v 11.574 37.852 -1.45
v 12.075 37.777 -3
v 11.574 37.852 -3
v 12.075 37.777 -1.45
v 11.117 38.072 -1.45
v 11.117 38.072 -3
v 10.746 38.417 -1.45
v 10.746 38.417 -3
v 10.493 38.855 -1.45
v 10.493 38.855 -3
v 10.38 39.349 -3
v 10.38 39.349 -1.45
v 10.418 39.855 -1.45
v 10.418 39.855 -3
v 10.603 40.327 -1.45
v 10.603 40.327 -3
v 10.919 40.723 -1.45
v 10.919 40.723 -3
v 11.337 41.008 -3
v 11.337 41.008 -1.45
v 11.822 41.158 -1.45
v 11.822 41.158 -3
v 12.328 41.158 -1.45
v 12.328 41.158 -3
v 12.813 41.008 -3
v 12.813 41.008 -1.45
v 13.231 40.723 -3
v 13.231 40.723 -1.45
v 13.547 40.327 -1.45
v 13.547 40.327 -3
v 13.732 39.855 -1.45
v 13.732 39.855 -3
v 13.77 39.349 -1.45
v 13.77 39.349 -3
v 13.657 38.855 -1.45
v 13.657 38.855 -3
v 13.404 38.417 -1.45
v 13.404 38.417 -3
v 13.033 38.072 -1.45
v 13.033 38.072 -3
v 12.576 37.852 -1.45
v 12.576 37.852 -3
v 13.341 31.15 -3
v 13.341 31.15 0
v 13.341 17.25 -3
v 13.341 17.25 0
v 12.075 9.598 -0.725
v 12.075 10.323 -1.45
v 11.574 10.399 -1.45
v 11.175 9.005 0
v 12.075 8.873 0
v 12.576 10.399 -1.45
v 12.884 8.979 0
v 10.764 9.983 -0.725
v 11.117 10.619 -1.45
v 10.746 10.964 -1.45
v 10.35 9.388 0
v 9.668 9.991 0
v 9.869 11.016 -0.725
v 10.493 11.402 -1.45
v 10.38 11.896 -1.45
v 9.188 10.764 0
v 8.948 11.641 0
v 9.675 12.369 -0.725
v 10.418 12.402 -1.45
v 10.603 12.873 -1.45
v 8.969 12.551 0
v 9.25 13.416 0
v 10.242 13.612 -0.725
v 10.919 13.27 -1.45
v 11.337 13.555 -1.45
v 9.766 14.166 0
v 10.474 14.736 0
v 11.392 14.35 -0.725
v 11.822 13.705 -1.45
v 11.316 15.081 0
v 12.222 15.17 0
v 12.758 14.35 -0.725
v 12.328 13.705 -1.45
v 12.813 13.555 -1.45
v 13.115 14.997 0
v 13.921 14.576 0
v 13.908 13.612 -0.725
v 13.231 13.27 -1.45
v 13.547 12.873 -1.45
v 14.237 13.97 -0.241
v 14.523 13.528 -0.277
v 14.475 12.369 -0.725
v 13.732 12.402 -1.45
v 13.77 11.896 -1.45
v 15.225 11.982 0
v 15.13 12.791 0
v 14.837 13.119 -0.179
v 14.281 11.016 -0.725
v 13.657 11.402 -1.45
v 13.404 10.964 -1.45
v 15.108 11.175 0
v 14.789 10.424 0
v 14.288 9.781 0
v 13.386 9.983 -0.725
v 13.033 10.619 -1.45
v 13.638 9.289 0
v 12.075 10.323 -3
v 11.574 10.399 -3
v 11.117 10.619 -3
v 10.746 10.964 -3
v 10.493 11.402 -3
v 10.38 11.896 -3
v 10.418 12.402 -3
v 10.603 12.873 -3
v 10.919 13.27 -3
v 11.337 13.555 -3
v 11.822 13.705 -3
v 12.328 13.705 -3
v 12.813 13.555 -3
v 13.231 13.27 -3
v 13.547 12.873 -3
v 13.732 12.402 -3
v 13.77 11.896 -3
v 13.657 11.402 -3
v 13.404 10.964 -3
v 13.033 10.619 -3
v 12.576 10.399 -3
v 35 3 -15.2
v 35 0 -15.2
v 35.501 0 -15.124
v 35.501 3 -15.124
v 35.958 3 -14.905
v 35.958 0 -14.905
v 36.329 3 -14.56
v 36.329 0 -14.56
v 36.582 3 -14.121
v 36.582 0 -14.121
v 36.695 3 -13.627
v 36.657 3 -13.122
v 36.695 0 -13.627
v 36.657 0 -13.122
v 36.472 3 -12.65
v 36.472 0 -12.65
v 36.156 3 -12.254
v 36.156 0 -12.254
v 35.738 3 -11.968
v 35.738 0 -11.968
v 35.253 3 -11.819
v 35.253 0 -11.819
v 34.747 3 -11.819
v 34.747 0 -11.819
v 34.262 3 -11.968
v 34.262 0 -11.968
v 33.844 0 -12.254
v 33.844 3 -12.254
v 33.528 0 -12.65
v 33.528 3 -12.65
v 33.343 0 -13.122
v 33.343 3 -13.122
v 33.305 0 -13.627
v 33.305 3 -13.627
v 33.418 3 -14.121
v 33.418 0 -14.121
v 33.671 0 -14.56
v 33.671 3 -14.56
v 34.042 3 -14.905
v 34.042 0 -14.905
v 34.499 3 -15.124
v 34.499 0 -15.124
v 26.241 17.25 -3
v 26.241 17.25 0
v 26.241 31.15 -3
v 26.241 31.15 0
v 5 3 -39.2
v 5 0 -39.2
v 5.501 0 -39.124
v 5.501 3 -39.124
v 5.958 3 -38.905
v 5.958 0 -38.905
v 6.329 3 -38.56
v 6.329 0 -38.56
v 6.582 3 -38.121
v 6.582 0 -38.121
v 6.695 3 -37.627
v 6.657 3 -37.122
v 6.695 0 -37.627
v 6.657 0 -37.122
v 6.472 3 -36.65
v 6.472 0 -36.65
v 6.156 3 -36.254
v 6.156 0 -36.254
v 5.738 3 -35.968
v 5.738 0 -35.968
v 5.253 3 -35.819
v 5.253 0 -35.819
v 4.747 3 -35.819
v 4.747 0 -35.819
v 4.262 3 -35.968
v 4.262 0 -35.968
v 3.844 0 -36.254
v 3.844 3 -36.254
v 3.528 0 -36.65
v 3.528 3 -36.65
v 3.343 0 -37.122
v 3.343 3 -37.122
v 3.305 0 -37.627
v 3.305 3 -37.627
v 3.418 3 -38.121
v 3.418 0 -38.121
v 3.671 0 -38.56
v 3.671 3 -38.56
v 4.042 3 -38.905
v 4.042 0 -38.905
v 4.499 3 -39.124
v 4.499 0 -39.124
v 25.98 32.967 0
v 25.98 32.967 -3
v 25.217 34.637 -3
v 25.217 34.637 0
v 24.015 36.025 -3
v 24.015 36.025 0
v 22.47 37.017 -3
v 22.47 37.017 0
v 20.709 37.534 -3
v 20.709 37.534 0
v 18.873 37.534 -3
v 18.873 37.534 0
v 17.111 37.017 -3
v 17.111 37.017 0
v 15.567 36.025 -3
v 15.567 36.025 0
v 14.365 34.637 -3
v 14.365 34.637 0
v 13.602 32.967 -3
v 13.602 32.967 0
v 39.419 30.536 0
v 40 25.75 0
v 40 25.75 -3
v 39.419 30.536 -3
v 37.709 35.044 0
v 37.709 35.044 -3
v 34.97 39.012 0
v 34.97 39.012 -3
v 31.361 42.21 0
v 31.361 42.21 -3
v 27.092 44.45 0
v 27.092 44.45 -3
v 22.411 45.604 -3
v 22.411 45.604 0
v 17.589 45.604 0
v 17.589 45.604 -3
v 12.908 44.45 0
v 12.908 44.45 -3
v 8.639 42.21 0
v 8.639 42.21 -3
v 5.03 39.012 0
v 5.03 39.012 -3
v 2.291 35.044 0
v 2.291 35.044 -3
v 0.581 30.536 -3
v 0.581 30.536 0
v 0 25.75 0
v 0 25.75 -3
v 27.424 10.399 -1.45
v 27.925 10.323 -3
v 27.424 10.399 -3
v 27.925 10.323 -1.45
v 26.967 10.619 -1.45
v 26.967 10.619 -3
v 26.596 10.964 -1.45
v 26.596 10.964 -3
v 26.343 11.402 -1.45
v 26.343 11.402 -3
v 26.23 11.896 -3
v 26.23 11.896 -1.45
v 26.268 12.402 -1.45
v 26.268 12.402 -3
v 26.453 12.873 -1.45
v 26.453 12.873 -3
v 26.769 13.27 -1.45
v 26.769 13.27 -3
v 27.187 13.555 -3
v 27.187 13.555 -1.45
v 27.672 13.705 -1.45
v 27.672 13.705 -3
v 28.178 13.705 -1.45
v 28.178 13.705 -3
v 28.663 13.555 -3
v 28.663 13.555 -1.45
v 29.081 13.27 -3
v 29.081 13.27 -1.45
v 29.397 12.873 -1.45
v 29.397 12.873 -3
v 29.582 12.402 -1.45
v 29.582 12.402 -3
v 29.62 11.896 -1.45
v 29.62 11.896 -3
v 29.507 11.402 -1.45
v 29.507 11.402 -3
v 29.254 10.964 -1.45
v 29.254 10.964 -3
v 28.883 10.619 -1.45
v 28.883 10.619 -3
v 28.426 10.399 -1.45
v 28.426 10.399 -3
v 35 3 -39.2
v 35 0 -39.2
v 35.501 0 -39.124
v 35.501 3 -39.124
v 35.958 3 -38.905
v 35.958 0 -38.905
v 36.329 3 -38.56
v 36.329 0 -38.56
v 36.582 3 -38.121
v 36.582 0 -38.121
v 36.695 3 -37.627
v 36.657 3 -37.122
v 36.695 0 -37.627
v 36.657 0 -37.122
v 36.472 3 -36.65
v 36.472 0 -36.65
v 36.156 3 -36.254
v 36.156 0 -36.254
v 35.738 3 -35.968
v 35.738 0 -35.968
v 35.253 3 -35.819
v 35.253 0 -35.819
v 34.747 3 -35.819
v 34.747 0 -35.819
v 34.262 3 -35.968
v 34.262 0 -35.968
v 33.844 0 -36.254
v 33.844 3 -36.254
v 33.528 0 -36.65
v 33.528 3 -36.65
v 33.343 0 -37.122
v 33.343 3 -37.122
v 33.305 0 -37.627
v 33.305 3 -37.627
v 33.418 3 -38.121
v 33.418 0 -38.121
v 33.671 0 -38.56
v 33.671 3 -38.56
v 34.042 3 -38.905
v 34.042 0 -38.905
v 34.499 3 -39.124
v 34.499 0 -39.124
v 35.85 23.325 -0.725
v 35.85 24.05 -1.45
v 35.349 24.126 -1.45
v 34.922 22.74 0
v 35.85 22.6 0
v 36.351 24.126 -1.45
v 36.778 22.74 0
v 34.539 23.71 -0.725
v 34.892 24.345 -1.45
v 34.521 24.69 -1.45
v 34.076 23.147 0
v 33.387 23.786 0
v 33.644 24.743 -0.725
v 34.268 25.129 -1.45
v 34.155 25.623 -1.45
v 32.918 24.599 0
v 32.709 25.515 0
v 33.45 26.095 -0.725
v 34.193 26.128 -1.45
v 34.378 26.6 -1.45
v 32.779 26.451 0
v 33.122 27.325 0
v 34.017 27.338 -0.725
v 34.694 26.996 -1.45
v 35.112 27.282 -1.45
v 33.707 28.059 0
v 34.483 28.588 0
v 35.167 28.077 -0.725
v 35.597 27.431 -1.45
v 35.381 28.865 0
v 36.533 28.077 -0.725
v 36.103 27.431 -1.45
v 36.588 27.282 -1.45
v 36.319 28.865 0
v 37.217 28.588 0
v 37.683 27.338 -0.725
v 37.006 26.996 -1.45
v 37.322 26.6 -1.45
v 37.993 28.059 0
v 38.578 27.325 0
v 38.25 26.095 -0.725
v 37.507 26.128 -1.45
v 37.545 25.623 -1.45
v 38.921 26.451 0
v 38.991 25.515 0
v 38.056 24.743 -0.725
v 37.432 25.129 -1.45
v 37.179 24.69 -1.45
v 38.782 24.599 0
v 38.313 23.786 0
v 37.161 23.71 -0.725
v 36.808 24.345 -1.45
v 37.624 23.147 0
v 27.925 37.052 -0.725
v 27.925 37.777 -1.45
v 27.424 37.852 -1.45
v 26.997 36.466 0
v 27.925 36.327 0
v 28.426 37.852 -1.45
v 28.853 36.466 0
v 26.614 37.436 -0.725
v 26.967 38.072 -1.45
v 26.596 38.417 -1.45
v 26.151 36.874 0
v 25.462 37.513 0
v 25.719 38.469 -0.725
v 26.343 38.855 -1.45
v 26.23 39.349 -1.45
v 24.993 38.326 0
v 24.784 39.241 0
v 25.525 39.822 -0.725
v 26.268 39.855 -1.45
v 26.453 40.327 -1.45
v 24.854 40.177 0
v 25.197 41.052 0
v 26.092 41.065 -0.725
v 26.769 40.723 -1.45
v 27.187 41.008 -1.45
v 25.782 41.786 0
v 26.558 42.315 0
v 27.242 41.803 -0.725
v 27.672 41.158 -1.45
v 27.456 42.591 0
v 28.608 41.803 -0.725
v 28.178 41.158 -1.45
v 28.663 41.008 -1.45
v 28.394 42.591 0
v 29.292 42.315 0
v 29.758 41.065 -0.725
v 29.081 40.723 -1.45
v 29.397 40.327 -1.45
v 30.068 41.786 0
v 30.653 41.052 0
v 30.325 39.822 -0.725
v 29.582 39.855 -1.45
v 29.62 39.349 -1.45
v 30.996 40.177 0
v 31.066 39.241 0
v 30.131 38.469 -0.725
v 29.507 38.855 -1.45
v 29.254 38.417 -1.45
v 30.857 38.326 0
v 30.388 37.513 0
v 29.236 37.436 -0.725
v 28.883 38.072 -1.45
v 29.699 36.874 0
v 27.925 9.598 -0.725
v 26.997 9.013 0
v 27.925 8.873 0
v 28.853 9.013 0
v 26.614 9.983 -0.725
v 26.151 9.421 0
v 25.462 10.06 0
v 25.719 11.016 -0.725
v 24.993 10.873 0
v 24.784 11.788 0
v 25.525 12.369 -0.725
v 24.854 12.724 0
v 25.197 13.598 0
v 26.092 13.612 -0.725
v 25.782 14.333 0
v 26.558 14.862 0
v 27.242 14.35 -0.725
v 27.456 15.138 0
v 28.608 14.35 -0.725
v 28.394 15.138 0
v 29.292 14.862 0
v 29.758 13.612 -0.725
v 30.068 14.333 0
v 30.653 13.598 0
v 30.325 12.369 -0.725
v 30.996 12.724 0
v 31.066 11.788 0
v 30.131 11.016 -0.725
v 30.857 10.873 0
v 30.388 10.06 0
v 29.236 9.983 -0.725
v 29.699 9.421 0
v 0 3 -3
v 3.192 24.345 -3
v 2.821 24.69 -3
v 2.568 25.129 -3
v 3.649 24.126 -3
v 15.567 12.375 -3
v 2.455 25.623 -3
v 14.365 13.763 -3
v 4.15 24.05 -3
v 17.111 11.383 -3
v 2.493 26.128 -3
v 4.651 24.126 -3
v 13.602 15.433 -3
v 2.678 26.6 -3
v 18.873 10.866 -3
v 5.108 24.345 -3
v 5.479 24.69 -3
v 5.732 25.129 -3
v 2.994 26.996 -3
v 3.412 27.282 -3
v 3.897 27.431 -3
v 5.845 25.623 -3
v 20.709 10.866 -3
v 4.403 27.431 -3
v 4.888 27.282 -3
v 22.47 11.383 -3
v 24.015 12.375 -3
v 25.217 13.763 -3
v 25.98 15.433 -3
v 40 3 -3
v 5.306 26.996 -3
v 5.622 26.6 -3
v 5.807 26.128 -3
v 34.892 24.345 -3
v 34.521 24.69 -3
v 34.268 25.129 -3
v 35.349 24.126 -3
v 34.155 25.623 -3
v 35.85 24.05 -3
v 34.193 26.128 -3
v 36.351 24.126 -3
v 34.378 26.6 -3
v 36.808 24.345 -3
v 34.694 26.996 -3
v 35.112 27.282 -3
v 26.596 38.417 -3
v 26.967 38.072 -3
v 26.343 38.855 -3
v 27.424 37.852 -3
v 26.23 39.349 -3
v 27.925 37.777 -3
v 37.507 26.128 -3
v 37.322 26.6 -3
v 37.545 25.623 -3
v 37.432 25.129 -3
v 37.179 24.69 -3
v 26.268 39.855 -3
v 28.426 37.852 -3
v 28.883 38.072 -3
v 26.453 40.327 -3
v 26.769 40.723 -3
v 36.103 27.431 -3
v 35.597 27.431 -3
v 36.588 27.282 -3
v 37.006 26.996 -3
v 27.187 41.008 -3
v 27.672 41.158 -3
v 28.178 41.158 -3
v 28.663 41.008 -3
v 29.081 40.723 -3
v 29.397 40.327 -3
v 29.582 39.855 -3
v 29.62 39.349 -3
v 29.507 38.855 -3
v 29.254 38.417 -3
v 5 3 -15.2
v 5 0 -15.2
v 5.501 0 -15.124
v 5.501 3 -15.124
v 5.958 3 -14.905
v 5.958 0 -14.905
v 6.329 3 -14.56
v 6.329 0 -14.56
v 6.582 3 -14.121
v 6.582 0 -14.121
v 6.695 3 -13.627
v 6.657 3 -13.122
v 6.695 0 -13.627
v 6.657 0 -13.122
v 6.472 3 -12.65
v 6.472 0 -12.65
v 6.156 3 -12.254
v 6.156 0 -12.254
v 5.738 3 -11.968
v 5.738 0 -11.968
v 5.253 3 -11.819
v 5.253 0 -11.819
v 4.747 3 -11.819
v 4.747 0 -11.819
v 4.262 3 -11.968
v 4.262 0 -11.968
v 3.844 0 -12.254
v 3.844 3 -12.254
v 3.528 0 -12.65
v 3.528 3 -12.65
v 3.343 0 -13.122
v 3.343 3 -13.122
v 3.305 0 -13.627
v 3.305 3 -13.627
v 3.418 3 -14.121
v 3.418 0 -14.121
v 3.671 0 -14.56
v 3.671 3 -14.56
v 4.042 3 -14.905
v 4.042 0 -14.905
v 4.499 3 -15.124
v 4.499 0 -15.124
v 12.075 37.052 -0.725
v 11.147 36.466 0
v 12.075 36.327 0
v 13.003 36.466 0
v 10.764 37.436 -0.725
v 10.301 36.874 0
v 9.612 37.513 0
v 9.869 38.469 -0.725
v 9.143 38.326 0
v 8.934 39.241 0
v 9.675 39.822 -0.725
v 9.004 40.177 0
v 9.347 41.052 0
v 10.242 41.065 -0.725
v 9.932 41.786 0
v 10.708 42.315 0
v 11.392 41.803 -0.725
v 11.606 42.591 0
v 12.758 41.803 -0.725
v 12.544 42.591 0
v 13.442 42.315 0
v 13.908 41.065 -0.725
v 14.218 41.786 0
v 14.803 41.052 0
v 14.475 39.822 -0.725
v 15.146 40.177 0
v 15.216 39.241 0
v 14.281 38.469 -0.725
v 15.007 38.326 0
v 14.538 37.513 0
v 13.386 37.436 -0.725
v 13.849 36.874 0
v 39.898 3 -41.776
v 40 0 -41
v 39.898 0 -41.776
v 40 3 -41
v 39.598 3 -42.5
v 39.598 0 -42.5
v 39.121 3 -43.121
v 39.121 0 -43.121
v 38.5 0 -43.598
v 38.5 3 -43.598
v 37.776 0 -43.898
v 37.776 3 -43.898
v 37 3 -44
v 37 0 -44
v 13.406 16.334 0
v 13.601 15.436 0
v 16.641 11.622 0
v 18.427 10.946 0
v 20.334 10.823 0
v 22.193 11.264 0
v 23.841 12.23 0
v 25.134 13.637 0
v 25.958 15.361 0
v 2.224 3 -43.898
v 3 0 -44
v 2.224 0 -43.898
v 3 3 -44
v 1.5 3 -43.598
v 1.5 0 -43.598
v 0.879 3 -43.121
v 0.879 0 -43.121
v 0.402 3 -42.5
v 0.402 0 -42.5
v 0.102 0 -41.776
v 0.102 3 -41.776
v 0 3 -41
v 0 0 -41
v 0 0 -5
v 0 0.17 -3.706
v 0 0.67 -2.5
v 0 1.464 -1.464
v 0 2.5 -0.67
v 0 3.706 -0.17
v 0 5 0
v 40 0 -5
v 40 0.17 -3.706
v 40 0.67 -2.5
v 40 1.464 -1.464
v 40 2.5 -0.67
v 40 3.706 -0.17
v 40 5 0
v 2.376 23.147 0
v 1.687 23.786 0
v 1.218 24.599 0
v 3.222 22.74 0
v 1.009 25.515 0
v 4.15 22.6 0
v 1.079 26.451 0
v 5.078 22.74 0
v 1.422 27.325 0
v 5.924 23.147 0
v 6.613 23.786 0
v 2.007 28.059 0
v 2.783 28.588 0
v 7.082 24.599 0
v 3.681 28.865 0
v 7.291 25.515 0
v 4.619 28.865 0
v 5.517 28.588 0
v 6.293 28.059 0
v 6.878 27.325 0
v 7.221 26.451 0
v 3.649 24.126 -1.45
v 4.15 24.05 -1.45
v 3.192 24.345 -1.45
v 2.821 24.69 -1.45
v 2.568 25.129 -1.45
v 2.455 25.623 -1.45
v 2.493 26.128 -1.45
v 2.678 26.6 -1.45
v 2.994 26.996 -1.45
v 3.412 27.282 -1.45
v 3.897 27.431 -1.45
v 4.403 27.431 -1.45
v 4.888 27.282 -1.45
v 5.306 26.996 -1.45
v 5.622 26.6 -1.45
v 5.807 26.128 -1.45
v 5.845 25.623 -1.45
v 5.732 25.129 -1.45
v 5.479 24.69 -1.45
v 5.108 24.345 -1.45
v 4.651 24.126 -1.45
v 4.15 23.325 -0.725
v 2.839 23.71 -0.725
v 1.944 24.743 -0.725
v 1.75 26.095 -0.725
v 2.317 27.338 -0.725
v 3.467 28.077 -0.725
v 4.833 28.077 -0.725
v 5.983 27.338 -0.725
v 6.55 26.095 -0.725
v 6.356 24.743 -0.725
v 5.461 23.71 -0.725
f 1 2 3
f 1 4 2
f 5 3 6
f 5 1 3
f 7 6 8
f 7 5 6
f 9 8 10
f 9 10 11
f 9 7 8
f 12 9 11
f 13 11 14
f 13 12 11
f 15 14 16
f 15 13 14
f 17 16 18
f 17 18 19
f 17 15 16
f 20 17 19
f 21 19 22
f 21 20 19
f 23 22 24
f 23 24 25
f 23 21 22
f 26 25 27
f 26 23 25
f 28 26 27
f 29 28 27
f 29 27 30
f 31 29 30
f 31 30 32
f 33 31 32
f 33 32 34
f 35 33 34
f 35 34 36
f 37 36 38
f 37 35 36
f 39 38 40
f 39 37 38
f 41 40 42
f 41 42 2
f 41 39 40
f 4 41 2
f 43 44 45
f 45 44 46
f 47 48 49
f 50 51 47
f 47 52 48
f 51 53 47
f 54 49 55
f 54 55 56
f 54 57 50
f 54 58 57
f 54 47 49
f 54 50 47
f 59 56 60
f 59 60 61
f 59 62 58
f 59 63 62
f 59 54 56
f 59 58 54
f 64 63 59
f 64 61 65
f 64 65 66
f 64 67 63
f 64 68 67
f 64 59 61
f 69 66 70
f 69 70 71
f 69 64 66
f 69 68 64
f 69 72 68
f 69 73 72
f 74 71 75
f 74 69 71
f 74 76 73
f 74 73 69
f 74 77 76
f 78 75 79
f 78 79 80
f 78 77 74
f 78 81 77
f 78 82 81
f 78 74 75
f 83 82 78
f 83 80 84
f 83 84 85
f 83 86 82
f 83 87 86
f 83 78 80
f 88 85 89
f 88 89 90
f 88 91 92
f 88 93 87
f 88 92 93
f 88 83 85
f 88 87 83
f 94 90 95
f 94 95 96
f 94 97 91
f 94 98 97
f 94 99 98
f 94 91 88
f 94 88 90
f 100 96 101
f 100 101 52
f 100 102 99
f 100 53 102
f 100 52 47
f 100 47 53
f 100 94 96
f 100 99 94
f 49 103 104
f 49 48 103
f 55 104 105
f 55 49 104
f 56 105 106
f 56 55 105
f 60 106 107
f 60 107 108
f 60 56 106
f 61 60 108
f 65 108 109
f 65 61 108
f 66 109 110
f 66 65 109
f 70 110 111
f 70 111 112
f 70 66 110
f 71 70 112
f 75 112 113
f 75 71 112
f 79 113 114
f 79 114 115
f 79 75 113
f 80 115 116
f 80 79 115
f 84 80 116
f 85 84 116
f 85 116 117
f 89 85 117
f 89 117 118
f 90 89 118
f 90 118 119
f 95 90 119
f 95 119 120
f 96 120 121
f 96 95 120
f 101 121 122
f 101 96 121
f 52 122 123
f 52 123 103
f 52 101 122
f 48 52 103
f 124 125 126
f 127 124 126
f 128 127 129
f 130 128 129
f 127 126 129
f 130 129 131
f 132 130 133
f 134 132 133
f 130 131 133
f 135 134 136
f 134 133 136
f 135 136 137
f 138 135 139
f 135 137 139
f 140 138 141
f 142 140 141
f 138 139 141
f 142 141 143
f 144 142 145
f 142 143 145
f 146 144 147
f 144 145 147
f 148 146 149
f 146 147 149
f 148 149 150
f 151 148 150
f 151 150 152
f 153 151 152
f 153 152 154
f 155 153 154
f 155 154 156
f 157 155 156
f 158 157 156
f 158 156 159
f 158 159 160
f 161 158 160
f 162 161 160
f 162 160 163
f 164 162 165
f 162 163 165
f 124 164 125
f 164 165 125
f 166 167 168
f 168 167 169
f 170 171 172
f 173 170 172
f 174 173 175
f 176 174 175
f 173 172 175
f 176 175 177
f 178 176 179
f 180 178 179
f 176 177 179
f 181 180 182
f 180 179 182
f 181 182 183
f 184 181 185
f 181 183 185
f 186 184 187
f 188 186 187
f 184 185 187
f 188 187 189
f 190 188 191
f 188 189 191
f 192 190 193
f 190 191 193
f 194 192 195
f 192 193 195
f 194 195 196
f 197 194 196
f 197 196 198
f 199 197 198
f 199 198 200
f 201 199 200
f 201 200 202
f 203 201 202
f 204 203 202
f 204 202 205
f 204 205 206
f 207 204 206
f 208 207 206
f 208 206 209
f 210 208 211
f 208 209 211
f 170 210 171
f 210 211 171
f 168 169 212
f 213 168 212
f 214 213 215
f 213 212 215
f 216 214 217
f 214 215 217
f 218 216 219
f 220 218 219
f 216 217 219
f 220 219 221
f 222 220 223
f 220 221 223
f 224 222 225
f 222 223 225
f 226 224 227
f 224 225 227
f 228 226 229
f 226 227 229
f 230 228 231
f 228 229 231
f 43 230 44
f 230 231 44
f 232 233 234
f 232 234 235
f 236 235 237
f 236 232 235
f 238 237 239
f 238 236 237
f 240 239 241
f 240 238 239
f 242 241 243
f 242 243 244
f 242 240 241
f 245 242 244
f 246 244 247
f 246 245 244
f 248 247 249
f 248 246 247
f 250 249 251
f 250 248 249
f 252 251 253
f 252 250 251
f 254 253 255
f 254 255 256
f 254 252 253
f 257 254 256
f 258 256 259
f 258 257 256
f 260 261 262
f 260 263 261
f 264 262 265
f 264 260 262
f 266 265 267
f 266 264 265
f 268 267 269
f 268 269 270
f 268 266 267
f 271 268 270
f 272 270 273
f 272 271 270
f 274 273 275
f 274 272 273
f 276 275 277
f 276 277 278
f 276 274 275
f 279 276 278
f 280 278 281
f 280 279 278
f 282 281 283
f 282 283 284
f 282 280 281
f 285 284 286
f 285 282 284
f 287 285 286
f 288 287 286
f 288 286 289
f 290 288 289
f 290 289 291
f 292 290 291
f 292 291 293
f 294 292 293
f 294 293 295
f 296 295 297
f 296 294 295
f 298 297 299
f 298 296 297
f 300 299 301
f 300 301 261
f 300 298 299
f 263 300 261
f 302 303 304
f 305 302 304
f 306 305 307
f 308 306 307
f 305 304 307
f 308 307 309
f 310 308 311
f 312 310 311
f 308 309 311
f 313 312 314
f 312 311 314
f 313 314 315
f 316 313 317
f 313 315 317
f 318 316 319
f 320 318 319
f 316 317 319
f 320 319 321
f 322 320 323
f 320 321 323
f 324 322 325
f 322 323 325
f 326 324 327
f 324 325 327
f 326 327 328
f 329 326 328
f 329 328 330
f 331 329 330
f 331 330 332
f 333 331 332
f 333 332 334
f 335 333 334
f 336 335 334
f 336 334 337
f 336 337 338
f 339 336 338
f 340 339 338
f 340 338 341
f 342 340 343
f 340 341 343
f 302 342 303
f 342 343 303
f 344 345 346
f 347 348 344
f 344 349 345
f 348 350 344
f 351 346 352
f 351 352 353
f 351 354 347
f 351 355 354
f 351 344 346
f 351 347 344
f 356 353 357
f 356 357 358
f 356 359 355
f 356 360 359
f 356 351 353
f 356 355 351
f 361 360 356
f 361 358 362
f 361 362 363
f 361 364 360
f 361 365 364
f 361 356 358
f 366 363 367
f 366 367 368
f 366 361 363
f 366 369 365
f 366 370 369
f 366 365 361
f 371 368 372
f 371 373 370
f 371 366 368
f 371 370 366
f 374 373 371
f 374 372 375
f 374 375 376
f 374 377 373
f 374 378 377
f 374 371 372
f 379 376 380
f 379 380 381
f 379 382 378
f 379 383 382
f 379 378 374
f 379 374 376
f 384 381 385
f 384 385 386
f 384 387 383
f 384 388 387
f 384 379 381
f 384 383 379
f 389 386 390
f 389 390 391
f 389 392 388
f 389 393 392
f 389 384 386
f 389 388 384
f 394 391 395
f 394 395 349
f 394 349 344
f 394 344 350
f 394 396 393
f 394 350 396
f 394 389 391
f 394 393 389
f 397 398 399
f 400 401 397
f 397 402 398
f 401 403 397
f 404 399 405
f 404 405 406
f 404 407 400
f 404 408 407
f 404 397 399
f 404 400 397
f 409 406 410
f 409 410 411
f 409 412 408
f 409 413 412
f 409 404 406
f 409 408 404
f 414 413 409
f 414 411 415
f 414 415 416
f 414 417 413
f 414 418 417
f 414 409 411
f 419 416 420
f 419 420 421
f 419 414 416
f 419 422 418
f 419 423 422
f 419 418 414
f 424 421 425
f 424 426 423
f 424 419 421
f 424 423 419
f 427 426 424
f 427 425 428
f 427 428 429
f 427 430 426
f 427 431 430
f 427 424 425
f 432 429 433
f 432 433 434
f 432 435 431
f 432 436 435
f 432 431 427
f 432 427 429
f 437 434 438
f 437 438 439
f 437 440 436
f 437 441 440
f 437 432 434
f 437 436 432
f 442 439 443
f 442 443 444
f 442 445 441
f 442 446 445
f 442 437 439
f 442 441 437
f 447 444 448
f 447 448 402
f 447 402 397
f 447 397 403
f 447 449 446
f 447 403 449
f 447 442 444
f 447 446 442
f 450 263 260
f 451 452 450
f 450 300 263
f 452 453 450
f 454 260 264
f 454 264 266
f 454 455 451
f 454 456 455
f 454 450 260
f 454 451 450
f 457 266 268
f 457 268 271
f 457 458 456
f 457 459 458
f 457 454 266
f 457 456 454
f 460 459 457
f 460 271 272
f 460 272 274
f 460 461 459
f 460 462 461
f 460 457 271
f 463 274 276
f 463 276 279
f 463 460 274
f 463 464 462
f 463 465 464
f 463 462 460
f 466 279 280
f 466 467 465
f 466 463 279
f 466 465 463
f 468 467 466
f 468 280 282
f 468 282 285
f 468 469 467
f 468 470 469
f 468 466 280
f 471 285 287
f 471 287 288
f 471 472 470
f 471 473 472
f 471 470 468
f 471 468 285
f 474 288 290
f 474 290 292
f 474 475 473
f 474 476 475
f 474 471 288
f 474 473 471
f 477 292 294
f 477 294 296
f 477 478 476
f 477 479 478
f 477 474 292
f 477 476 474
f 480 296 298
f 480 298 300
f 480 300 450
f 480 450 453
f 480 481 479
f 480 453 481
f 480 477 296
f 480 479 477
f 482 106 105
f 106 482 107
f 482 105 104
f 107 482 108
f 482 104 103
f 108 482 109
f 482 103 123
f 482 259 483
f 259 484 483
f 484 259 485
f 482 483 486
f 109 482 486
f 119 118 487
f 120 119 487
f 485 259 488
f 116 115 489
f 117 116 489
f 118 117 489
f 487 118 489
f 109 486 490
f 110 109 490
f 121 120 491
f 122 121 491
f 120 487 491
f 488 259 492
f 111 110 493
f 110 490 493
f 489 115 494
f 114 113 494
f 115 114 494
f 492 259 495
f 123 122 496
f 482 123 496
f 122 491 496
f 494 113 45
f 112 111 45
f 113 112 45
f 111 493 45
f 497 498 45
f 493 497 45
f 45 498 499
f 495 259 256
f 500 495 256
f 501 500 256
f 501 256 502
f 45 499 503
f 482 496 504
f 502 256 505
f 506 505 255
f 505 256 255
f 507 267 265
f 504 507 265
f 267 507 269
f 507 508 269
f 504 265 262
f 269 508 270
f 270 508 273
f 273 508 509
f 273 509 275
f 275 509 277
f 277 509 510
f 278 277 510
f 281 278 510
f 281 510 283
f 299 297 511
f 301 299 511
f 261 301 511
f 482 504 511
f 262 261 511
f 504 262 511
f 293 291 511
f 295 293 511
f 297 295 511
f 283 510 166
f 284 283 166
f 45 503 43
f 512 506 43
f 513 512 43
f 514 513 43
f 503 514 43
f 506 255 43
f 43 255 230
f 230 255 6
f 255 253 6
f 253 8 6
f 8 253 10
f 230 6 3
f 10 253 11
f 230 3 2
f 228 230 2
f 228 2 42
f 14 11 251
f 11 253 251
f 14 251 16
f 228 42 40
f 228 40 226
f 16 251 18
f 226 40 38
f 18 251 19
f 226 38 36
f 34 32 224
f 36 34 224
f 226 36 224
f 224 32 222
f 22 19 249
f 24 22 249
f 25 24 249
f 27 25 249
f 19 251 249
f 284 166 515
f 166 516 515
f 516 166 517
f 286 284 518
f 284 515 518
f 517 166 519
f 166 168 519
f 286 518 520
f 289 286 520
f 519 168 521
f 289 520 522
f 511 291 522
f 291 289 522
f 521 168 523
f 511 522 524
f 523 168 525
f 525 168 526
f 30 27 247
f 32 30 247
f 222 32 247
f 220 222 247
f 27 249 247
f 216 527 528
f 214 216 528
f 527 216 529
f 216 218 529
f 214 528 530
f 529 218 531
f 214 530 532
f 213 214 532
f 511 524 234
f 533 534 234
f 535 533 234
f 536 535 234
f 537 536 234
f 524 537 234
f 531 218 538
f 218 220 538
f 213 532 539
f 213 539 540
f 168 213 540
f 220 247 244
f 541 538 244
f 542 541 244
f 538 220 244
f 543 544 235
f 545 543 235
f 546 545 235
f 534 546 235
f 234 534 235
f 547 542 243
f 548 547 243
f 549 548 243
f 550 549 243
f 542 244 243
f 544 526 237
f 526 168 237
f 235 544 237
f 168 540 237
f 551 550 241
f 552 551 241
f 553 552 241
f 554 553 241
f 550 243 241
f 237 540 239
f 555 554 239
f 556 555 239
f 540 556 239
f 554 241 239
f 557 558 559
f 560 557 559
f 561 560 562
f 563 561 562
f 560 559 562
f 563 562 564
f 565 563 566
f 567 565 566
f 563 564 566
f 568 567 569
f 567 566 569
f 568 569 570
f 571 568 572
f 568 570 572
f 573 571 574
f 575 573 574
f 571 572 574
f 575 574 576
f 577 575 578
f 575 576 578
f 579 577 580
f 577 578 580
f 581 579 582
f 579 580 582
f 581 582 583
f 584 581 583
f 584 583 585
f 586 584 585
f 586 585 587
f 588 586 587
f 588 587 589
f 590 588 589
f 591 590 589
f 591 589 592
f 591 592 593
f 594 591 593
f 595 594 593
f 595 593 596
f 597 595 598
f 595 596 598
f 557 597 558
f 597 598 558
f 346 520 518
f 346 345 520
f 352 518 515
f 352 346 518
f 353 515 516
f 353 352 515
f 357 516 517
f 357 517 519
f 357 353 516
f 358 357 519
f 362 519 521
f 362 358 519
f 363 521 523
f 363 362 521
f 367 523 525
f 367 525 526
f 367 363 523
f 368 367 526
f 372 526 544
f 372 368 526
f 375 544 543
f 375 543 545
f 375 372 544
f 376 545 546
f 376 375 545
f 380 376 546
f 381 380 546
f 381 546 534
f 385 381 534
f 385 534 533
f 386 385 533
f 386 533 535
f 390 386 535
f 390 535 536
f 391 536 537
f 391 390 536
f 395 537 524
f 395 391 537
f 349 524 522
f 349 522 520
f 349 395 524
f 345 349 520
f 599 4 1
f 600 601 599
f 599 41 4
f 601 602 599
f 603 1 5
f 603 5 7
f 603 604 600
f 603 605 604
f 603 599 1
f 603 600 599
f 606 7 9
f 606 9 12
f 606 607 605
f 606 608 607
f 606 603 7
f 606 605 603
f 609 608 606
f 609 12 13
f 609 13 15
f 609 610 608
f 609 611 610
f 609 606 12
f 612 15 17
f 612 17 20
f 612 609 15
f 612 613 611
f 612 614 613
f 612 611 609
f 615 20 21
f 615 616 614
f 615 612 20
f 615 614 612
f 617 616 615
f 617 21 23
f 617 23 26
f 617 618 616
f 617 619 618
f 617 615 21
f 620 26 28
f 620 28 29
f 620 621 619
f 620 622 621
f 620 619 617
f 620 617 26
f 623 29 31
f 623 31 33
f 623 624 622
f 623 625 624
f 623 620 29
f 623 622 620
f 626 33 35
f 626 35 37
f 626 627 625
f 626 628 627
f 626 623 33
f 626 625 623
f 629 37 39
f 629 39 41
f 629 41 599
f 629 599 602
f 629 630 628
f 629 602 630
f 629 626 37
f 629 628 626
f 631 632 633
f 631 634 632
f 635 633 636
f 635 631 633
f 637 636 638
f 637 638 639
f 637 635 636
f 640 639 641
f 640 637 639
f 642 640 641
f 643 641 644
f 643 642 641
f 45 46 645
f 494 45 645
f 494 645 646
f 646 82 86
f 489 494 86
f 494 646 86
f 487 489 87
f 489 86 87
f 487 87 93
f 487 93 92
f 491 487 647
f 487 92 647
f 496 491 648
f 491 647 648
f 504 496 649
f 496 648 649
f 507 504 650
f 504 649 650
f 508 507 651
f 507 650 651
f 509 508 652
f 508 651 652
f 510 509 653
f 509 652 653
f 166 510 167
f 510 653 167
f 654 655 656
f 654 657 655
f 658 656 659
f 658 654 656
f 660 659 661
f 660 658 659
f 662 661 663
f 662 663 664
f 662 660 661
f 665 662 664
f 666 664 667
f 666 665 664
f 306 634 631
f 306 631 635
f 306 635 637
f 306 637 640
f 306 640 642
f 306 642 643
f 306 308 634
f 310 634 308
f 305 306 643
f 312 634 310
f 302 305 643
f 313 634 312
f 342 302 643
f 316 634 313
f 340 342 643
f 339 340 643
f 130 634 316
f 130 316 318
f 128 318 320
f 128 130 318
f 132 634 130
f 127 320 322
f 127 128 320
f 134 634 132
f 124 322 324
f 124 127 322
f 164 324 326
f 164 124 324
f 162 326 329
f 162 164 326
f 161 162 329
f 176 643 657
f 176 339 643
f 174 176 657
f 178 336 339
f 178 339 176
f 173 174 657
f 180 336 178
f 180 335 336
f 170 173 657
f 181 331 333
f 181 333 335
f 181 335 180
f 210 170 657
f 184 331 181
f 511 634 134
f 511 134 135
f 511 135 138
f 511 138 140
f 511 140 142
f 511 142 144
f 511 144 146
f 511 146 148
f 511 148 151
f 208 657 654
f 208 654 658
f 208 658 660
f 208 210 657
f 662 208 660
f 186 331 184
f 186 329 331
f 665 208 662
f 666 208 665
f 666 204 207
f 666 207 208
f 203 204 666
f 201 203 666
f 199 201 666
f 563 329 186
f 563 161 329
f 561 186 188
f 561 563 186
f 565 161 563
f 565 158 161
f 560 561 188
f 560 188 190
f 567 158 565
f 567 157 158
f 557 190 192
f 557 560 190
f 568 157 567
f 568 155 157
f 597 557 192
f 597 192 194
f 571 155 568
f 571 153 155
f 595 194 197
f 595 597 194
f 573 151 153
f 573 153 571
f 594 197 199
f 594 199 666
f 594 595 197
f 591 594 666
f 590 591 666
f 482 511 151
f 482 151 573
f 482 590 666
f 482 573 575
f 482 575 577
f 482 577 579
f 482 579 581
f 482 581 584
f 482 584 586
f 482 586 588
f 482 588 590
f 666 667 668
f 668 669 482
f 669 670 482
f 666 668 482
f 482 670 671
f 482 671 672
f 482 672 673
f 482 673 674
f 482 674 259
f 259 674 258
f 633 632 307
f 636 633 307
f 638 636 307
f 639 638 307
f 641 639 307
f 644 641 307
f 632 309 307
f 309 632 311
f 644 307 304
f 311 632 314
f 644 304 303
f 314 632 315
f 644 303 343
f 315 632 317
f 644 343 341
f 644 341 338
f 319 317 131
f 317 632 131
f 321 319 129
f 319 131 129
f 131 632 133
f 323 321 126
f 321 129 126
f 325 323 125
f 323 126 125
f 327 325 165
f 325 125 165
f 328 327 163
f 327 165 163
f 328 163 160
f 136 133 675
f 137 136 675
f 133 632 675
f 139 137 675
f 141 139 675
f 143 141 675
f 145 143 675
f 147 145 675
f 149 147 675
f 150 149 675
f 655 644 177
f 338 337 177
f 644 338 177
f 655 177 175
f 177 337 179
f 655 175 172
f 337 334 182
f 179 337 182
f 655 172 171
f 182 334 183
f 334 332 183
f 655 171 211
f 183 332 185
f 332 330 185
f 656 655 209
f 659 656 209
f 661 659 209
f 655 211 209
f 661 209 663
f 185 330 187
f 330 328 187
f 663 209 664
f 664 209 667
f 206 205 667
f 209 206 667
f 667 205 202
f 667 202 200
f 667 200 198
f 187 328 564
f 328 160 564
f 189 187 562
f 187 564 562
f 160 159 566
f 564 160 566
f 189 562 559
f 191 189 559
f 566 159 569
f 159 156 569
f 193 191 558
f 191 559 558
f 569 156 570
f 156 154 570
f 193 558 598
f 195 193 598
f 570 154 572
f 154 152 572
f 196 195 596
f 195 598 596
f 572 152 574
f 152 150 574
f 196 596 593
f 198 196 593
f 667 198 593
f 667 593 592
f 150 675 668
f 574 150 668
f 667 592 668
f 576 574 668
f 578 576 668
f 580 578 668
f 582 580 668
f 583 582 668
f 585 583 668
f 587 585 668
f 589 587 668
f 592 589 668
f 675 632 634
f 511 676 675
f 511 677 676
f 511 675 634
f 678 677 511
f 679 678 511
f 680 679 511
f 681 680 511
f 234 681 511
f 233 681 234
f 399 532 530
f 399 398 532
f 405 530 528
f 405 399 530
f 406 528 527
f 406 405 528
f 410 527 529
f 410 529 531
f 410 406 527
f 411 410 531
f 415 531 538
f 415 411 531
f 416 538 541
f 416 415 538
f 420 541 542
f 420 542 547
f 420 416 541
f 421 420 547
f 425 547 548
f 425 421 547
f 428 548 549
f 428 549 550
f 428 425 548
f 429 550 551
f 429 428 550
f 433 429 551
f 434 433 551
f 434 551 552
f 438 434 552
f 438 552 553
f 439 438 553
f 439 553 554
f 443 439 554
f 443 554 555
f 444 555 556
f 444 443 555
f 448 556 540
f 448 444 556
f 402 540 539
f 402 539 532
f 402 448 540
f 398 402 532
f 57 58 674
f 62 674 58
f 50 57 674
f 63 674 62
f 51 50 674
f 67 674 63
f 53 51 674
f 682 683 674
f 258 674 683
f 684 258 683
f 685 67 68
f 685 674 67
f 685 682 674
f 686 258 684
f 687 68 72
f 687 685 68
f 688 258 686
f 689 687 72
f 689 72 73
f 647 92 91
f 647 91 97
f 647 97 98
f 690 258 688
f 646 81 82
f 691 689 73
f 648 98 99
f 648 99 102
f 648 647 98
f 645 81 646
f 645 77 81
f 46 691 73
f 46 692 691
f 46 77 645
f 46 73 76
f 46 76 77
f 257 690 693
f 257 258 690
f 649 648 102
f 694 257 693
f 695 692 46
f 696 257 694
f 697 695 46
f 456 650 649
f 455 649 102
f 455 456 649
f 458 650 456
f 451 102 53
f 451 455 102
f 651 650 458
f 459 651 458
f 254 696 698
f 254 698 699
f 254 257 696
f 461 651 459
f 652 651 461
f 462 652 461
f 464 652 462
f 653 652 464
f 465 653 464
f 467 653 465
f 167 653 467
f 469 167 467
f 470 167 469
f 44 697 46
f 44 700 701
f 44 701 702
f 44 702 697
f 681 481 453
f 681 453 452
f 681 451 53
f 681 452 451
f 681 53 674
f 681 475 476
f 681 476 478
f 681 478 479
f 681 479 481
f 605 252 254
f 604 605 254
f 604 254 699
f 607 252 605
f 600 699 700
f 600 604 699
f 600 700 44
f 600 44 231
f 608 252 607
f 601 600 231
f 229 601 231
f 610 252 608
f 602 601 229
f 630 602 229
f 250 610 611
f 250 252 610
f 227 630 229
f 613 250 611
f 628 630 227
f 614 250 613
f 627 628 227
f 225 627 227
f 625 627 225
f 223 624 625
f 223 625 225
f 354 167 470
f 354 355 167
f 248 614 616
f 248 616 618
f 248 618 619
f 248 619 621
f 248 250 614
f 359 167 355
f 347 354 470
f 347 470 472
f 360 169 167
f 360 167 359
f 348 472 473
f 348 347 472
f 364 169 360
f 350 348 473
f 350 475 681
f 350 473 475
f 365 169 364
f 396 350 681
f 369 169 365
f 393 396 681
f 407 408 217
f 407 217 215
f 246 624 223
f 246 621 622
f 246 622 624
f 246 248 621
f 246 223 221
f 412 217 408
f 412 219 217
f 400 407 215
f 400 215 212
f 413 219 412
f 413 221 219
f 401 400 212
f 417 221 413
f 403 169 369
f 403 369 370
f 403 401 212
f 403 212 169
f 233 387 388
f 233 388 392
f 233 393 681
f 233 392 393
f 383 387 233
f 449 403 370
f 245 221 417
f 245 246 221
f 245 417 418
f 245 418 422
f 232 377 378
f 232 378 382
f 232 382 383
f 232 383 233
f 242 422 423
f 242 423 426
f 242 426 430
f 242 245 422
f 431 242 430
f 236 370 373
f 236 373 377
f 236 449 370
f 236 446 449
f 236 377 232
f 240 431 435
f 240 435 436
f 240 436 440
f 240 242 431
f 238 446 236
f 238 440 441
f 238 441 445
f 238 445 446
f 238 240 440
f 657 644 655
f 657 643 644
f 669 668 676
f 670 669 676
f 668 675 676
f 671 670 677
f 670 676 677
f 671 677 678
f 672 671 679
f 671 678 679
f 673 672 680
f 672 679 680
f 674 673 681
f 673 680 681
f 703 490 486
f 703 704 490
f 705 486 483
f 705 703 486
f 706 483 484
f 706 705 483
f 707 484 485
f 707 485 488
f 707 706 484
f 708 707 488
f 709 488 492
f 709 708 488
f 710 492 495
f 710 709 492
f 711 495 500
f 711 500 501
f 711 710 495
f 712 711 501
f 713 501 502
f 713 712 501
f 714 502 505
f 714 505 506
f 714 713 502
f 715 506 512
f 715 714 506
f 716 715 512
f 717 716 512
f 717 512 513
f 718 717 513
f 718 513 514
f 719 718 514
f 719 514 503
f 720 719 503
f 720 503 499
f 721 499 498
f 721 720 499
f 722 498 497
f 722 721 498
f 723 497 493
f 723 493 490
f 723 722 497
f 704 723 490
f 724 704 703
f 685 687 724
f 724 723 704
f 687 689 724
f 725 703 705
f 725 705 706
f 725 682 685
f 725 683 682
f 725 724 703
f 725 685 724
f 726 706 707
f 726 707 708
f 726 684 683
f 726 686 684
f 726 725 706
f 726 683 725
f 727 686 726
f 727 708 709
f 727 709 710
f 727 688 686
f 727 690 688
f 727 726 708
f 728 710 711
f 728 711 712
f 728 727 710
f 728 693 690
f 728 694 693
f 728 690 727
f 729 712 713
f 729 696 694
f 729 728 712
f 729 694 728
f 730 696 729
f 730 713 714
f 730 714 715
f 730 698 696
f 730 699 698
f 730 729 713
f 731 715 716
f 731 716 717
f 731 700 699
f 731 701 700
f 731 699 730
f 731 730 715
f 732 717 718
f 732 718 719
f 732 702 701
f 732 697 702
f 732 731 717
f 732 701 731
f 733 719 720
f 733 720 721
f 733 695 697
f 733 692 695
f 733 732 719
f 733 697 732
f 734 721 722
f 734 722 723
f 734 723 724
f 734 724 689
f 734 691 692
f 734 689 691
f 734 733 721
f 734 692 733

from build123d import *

# Parameters (mm, degrees)
BOSS_EXTRUDE1_DEPTH                            = 3
CSK_FOR_M3_FLAT_HEAD_MACHINE_SCREW1_AT_2_COUNT = 2
CSK_FOR_M3_FLAT_HEAD_MACHINE_SCREW1_AT_2_PITCH = 15.85
CSK_FOR_M3_FLAT_HEAD_MACHINE_SCREW1_AT_3_COUNT = 2
CSK_FOR_M3_FLAT_HEAD_MACHINE_SCREW1_AT_3_PITCH = 27.4530053
CSK_FOR_M3_FLAT_HEAD_MACHINE_SCREW1_AT_4_COUNT = 2
CSK_FOR_M3_FLAT_HEAD_MACHINE_SCREW1_AT_4_PITCH = 31.7
CSK_FOR_M3_FLAT_HEAD_MACHINE_SCREW1_AT_5_COUNT = 2
CSK_FOR_M3_FLAT_HEAD_MACHINE_SCREW1_AT_5_PITCH = 27.4530053
CSK_FOR_M3_FLAT_HEAD_MACHINE_SCREW1_AT_6_COUNT = 2
CSK_FOR_M3_FLAT_HEAD_MACHINE_SCREW1_AT_6_PITCH = 15.85
SKETCH6_W                                      = 40
SKETCH6_H                                      = 3
BOSS_EXTRUDE2_DEPTH                            = 41
SKETCH7_R                                      = 1.7
CUT_EXTRUDE1_DEPTH                             = 3
FILLET1_R                                      = 3
FILLET2_R                                      = 5


with BuildPart() as part:
    # Sketch2 → Boss-Extrude1 (new body)
    with BuildSketch(Plane.XY):
        with BuildLine():
            Line((0, 0), (40, 0))
            Line((40, 0), (40, 25.75))
            ThreePointArc((40, 25.75), (20, 45.75), (0, 25.75))
            Line((0, 25.75), (0, 0))
        make_face()
        with BuildLine():
            Line((26.240819183, 17.25), (26.240819183, 31.15))
            ThreePointArc((26.240819183, 31.15), (19.790819183, 37.6), (13.340819183, 31.15))
            Line((13.340819183, 31.15), (13.340819183, 17.25))
            ThreePointArc((13.340819183, 17.25), (19.790819183, 10.8), (26.240819183, 17.25))
        make_face(mode=Mode.SUBTRACT)
    extrude(amount=-BOSS_EXTRUDE1_DEPTH)

    # Sketch4 → CSK for M3 Flat Head Machine Screw1 (revolve, cut)
    with BuildSketch(Plane(origin=(4.15, 25.75, 0), x_dir=(0, -1, 0), z_dir=(1, 0, 0))):
        Polygon((0, 0), (0, 3), (1.7, 3), (1.7, 1.45), (3.15, 0), align=None)
    csk_for_m3_flat_head_machine_screw1 = revolve(axis=Axis((4.15, 25.75, 6.35), (0, 0, -1)), mode=Mode.SUBTRACT)

    # CSK for M3 Flat Head Machine Screw1 at 2: CSK for M3 Flat Head Machine Screw1 ×2
    with Locations(*[Vector(0.49999999999999317, 0.8660254037844426, 0) * (i * CSK_FOR_M3_FLAT_HEAD_MACHINE_SCREW1_AT_2_PITCH) for i in range(1, CSK_FOR_M3_FLAT_HEAD_MACHINE_SCREW1_AT_2_COUNT)]):
        add(csk_for_m3_flat_head_machine_screw1, mode=Mode.SUBTRACT)

    # CSK for M3 Flat Head Machine Screw1 at 3: CSK for M3 Flat Head Machine Screw1 ×2
    with Locations(*[Vector(0.8660254037844348, 0.5000000000000067, 0) * (i * CSK_FOR_M3_FLAT_HEAD_MACHINE_SCREW1_AT_3_PITCH) for i in range(1, CSK_FOR_M3_FLAT_HEAD_MACHINE_SCREW1_AT_3_COUNT)]):
        add(csk_for_m3_flat_head_machine_screw1, mode=Mode.SUBTRACT)

    # CSK for M3 Flat Head Machine Screw1 at 4: CSK for M3 Flat Head Machine Screw1 ×2
    with Locations(*[(i * CSK_FOR_M3_FLAT_HEAD_MACHINE_SCREW1_AT_4_PITCH, 0, 0) for i in range(1, CSK_FOR_M3_FLAT_HEAD_MACHINE_SCREW1_AT_4_COUNT)]):
        add(csk_for_m3_flat_head_machine_screw1, mode=Mode.SUBTRACT)

    # CSK for M3 Flat Head Machine Screw1 at 5: CSK for M3 Flat Head Machine Screw1 ×2
    with Locations(*[Vector(0.8660254037844427, -0.49999999999999306, 0) * (i * CSK_FOR_M3_FLAT_HEAD_MACHINE_SCREW1_AT_5_PITCH) for i in range(1, CSK_FOR_M3_FLAT_HEAD_MACHINE_SCREW1_AT_5_COUNT)]):
        add(csk_for_m3_flat_head_machine_screw1, mode=Mode.SUBTRACT)

    # CSK for M3 Flat Head Machine Screw1 at 6: CSK for M3 Flat Head Machine Screw1 ×2
    with Locations(*[Vector(0.5000000000000067, -0.8660254037844349, 0) * (i * CSK_FOR_M3_FLAT_HEAD_MACHINE_SCREW1_AT_6_PITCH) for i in range(1, CSK_FOR_M3_FLAT_HEAD_MACHINE_SCREW1_AT_6_COUNT)]):
        add(csk_for_m3_flat_head_machine_screw1, mode=Mode.SUBTRACT)

    # Sketch6 → Boss-Extrude2 (add)
    with BuildSketch(Plane(origin=(0, 0, -3), x_dir=(-1, 0, 0), z_dir=(0, 0, -1))):
        with Locations((-20, 1.5)):
            Rectangle(SKETCH6_W, SKETCH6_H)
    extrude(amount=BOSS_EXTRUDE2_DEPTH)

    # Sketch7 → Cut-Extrude1 (cut)
    with BuildSketch(Plane.XZ):
        with Locations(Location((5, -37.5, 0), (0, 0, 270))):
            Circle(SKETCH7_R)
        with Locations(Location((5, -13.5, 0), (0, 0, 270))):
            Circle(SKETCH7_R)
        with Locations(Location((35, -37.5, 0), (0, 0, 270))):
            Circle(SKETCH7_R)
        with Locations(Location((35, -13.5, 0), (0, 0, 270))):
            Circle(SKETCH7_R)
    extrude(amount=-CUT_EXTRUDE1_DEPTH, mode=Mode.SUBTRACT)

    # Fillet1
    fillet1_edges = [part.edges().sort_by_distance(p)[0] for p in [
        (0, 1.5, -44),
        (40, 1.5, -44),
    ]]
    fillet(fillet1_edges, radius=FILLET1_R)

    # Fillet2
    fillet2_edges = [part.edges().sort_by_distance(p)[0] for p in [
        (20, 0, 0),
    ]]
    fillet(fillet2_edges, radius=FILLET2_R)


solid = part.part
